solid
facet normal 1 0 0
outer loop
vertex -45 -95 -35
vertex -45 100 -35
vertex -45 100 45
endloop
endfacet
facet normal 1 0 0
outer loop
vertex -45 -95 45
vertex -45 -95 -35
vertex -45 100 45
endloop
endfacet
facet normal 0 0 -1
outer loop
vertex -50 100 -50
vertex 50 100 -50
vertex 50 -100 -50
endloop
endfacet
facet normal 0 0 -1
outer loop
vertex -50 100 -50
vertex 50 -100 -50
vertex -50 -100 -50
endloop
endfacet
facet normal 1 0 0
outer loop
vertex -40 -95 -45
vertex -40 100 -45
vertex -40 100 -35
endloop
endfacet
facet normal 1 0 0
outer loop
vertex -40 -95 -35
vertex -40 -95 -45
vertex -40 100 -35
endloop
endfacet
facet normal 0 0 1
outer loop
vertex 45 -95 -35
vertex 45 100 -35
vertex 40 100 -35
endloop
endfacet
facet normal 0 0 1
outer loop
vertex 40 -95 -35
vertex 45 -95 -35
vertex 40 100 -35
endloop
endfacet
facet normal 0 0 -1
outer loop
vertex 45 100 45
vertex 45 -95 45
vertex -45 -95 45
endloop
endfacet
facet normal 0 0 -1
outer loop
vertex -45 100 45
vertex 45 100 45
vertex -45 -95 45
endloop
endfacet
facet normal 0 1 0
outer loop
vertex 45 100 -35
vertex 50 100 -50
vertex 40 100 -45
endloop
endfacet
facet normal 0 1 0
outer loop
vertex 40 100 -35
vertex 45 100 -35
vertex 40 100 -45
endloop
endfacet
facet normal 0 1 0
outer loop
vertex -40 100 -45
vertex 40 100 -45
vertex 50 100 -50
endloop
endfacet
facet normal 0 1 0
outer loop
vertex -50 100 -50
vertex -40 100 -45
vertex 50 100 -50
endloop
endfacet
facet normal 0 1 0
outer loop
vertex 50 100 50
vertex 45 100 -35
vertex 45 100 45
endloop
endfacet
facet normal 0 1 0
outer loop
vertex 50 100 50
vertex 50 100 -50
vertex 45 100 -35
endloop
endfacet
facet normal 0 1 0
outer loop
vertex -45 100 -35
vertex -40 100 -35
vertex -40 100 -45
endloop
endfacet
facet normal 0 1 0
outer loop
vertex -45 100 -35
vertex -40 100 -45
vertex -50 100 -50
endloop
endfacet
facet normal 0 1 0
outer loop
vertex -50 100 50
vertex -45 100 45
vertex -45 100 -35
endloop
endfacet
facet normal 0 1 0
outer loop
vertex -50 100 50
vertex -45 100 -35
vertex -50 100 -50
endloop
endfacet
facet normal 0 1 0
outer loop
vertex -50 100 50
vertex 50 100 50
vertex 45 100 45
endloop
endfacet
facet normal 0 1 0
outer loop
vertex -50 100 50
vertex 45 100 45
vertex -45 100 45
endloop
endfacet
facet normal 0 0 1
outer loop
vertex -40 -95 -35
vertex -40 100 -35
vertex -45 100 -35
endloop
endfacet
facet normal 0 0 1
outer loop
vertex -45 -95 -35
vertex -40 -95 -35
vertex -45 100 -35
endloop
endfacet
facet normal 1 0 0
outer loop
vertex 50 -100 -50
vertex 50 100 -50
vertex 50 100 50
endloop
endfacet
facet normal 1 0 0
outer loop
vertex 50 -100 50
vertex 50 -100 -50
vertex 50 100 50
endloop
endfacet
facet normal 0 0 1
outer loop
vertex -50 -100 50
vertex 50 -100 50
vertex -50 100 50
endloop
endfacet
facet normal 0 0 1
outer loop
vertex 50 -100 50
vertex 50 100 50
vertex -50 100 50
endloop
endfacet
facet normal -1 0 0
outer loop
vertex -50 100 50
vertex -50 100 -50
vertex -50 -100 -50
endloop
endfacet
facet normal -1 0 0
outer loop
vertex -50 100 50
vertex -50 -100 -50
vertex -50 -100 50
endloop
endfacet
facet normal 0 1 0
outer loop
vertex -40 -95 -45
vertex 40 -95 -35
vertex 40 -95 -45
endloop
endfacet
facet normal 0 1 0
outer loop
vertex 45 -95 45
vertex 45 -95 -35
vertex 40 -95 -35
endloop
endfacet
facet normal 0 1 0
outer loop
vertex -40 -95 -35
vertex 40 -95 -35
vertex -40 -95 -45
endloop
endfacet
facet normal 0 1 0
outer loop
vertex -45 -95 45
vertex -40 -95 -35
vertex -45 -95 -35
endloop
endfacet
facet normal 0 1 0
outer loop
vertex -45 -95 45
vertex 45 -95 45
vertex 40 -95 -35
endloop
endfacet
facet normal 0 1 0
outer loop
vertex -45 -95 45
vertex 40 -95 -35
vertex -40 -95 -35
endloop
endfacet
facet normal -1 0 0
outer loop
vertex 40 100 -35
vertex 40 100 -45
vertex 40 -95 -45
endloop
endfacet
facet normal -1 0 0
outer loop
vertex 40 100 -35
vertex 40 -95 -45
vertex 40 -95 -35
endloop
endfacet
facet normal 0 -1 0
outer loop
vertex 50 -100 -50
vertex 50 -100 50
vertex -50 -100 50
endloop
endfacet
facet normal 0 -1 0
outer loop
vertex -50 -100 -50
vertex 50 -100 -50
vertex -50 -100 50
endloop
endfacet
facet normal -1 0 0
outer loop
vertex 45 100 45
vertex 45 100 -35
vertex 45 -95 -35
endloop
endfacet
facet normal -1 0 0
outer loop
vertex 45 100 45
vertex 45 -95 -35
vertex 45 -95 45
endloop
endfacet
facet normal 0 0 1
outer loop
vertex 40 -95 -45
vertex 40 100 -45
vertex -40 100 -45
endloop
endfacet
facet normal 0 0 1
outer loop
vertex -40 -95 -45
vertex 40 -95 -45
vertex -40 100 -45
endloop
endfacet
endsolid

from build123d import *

# Parameters (mm, degrees)
SKETCH1_W           = 100
SKETCH1_H           = 100
BOSS_EXTRUDE1_DEPTH = 100
SHELL1_T            = -5
BOSS_EXTRUDE2_REACH = 214.132
SKETCH2_W           = 5
SKETCH2_H           = 10


with BuildPart() as part:
    # Sketch1 → Boss-Extrude1 (new, symmetric)
    with BuildSketch(Plane(origin=(0, 0, 0), x_dir=(-1, 0, 0), z_dir=(0, 1, 0))):
        Rectangle(SKETCH1_W, SKETCH1_H)
    extrude(amount=BOSS_EXTRUDE1_DEPTH, both=True)

    # Shell1
    shell1_openings = [part.faces().sort_by_distance(p)[0] for p in [
        (0, 100, 0),
    ]]
    offset(amount=SHELL1_T, openings=shell1_openings, kind=Kind.INTERSECTION)

    # Sketch2 → Boss-Extrude2 (add, up to next)
    with BuildSketch(Plane(origin=(0, 100, 0), x_dir=(-1, 0, 0), z_dir=(0, 1, 0)), mode=Mode.PRIVATE) as boss_extrude2_sk1:
        with Locations((-42.5, -40)):
            Rectangle(SKETCH2_W, SKETCH2_H)
    boss_extrude2_tool1 = extrude(boss_extrude2_sk1.sketch, amount=-BOSS_EXTRUDE2_REACH, mode=Mode.PRIVATE) - part.part
    # Sketch2 → Boss-Extrude2 (add, up to next)
    with BuildSketch(Plane(origin=(0, 100, 0), x_dir=(-1, 0, 0), z_dir=(0, 1, 0)), mode=Mode.PRIVATE) as boss_extrude2_sk2:
        with Locations((42.5, -40)):
            Rectangle(SKETCH2_W, SKETCH2_H)
    boss_extrude2_tool2 = extrude(boss_extrude2_sk2.sketch, amount=-BOSS_EXTRUDE2_REACH, mode=Mode.PRIVATE) - part.part
    add(boss_extrude2_tool1.solids().sort_by_distance((42.5, 100, -40))[0])
    add(boss_extrude2_tool2.solids().sort_by_distance((-42.5, 100, -40))[0])


solid = part.part
